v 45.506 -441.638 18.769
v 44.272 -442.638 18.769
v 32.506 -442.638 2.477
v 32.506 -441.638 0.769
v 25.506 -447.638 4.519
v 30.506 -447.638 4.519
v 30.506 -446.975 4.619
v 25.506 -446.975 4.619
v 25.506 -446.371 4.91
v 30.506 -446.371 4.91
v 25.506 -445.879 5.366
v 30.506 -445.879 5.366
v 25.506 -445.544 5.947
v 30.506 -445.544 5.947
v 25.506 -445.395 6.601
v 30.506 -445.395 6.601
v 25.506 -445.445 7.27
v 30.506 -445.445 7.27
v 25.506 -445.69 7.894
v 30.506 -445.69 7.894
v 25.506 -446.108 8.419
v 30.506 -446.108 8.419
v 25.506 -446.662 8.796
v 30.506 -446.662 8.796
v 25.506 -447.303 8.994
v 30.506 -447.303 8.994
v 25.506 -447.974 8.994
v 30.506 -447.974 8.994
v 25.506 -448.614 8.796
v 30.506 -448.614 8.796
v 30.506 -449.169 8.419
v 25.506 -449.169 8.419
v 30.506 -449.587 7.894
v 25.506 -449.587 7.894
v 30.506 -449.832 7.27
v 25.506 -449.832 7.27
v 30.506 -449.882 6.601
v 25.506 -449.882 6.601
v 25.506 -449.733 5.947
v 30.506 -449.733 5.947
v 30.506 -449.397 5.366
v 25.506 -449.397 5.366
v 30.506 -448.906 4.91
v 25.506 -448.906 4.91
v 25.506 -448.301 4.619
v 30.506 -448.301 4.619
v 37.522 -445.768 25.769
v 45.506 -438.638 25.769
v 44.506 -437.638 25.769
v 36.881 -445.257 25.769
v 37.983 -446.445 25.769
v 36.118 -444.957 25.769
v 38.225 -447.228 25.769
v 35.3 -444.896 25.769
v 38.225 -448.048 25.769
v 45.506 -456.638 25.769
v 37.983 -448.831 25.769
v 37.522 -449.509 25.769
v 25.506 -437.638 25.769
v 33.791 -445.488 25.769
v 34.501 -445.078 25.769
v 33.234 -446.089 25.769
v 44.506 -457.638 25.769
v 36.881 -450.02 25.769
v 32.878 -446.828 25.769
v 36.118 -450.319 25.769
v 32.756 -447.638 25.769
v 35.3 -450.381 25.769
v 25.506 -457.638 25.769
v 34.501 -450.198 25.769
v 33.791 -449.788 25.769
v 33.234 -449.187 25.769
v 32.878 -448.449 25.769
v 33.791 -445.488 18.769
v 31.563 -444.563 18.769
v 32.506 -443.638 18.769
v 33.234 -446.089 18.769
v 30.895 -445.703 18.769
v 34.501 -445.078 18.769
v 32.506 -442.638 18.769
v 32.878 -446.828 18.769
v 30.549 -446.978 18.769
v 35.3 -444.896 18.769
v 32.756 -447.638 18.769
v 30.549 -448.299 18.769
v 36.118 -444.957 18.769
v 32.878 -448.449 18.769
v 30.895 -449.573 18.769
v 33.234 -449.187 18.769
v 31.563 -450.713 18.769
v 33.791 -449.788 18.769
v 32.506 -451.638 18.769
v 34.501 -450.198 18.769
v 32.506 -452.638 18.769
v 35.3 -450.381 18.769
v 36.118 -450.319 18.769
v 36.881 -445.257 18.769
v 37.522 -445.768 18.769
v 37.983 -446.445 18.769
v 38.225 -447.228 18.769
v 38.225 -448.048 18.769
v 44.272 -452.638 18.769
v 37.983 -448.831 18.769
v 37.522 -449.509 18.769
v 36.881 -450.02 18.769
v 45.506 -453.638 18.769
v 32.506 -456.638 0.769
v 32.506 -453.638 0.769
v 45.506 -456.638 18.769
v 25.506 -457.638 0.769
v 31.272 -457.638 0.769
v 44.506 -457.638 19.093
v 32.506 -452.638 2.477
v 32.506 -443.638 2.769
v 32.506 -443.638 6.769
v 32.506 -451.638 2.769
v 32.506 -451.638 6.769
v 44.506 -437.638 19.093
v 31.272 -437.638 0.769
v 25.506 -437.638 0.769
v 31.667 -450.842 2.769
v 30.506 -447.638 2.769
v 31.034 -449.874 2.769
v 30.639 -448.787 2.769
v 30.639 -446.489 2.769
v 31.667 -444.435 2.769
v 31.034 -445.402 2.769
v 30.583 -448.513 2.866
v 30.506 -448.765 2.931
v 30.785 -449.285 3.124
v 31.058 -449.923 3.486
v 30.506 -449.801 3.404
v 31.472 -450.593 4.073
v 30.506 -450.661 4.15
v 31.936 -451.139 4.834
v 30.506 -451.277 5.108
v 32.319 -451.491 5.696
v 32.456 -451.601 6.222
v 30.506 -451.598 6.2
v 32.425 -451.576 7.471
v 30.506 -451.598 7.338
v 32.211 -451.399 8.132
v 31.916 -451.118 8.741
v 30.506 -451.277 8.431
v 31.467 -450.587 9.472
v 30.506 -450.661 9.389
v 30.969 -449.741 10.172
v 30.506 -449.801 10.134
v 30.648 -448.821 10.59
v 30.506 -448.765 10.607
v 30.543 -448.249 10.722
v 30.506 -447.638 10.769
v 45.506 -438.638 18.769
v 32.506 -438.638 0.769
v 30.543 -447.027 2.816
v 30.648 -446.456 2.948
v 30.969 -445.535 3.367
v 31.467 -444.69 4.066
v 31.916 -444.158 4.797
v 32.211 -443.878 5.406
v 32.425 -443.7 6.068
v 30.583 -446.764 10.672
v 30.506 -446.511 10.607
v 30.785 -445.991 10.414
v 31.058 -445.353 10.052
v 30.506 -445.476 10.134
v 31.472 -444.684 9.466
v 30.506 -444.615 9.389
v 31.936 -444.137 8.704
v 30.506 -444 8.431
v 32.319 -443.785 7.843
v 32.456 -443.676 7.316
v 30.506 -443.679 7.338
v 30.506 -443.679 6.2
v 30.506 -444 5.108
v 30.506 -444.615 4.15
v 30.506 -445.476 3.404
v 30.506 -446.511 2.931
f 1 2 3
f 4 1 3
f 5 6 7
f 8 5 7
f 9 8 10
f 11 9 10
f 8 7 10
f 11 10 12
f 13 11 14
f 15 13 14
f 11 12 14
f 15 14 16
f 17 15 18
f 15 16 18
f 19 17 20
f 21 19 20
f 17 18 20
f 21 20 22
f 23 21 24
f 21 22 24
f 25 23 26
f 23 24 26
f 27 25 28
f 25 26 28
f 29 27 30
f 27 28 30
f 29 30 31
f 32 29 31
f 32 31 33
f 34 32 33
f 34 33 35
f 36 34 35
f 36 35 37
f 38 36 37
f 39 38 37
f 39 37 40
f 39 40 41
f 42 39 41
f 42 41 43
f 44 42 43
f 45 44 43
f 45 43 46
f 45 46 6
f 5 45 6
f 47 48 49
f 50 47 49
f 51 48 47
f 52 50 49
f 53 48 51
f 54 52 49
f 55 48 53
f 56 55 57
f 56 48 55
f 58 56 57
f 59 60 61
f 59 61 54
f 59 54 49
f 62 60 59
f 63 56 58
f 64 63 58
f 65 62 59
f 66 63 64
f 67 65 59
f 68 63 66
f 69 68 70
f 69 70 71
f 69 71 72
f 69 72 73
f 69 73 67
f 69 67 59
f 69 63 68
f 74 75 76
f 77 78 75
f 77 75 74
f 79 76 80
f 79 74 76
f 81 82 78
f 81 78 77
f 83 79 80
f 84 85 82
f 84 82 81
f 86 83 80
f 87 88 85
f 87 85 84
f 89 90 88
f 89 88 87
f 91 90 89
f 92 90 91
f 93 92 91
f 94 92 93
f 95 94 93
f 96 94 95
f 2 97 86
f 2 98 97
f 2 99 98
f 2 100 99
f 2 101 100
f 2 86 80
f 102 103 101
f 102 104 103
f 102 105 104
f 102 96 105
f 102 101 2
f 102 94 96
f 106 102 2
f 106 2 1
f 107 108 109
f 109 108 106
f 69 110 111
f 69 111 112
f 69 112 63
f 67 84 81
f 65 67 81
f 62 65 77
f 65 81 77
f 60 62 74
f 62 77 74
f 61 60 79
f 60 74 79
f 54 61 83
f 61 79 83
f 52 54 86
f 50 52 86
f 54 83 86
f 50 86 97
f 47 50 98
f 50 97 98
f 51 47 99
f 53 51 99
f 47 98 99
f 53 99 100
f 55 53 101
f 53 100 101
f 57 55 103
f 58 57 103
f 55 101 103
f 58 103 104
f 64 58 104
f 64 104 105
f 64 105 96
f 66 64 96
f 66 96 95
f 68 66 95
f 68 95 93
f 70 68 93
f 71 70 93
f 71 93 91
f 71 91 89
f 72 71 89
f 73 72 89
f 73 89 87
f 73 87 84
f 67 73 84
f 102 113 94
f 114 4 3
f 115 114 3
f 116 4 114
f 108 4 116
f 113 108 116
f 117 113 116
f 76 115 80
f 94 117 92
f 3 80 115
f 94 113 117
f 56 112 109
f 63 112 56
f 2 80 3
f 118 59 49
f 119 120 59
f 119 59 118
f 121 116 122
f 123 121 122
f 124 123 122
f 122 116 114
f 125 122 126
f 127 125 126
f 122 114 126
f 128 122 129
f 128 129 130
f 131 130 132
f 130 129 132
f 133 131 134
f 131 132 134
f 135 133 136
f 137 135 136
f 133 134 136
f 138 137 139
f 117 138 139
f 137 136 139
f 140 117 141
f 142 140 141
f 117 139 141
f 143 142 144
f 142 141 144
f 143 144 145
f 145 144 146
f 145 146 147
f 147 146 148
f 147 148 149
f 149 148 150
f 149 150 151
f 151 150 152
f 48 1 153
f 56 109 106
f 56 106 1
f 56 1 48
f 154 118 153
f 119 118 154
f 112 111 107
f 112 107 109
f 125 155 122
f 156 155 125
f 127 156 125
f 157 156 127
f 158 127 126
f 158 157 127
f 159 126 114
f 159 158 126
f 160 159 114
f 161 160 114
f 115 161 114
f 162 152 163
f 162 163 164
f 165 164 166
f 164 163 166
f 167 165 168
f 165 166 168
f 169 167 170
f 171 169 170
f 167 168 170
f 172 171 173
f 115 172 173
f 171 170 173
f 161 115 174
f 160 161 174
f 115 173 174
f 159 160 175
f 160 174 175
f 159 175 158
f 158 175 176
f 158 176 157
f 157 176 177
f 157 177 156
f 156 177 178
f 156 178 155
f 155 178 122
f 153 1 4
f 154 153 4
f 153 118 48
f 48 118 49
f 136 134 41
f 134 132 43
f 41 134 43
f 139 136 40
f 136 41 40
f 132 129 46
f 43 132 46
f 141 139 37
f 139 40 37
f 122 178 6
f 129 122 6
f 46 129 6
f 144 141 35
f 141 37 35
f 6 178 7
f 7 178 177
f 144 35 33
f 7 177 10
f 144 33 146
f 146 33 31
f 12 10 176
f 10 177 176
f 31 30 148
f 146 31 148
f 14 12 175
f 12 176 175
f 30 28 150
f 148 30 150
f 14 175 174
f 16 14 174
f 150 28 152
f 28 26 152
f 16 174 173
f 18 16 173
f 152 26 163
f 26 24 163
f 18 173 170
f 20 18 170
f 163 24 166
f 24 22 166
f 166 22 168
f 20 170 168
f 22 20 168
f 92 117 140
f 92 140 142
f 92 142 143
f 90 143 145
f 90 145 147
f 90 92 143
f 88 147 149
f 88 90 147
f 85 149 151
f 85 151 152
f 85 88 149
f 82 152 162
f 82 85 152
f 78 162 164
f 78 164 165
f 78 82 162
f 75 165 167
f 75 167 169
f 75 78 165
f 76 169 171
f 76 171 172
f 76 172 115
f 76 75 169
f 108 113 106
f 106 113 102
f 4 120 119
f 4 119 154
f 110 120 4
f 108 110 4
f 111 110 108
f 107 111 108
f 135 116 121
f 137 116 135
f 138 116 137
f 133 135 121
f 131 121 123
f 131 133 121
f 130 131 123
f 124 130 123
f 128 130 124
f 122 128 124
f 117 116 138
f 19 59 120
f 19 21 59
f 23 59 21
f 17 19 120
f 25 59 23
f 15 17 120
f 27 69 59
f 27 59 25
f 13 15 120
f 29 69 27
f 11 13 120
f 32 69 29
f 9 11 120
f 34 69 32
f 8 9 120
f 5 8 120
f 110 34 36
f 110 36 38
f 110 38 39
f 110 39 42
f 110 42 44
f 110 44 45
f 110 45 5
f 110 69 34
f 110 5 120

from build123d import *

# Parameters (mm, degrees)
MAIN_DEPTH         = 20
SKETCH3_R          = 2.25
SCREW_HOLE_DEPTH   = 459.547512827
SKETCH4_R          = 2.75
SCREW_HOLE_2_DEPTH = 461.247257207
SCREW_CUT_R        = 5
SCREWCUT_DEPTH     = 16
CUT_EXTRUDE7_START = -5
SKETCH7_R          = 4
CUT_EXTRUDE7_DEPTH = 5
RIB3_REACH         = 57.989
SKETCH8_WALL_W     = 136.182475206
SKETCH8_WALL_H     = 5
RIB4_REACH         = 57.989
SKETCH9_WALL_W     = 136.182475206
SKETCH9_WALL_H     = 5
CHAMFER1_SIZE      = 1


with BuildPart() as part:
    # Sketch2 → main (new body)
    with BuildSketch(Plane(origin=(0, -457.638253618, -1.412254138), x_dir=(1, 0, 0), z_dir=(0, 1, 0))):
        Polygon((25.505676484, -2.181428465), (32.505676484, -2.181428465), (32.505676484, -20.181428465), (45.505676484, -20.181428465), (45.505676484, -27.181428465), (25.505676484, -27.181428465), align=None)
    extrude(amount=MAIN_DEPTH)

    # Sketch3 → screw_hole (cut, through all)
    with BuildSketch(Plane(origin=(32.505676484, 0, 0), x_dir=(0, 0, -1), z_dir=(1, 0, 0))):
        with Locations((-6.769174326, -447.638253618)):
            Circle(SKETCH3_R)
    extrude(amount=-SCREW_HOLE_DEPTH, mode=Mode.SUBTRACT)

    # Sketch4 → screw_hole_2 (cut, through all)
    with BuildSketch(Plane(origin=(0, 0, 18.769174326), x_dir=(-1, 0, 0), z_dir=(0, 0, -1))):
        with Locations((-35.505676484, -447.638253618)):
            Circle(SKETCH4_R)
    extrude(amount=-SCREW_HOLE_2_DEPTH, mode=Mode.SUBTRACT)

    # screw_cut → screwcut (cut)
    with BuildSketch(Plane(origin=(0, 0, 18.769174326), x_dir=(-1, 0, 0), z_dir=(0, 0, -1))):
        with Locations((-35.505676484, -447.638253618)):
            Circle(SCREW_CUT_R)
    extrude(amount=SCREWCUT_DEPTH, mode=Mode.SUBTRACT)

    # Sketch7 → Cut-Extrude7 (cut)
    with BuildSketch(Plane.ZY.offset(-25.505676484).offset(CUT_EXTRUDE7_START)):
        with Locations((6.769174326, -447.638253618)):
            Circle(SKETCH7_R)
    extrude(amount=-CUT_EXTRUDE7_DEPTH, mode=Mode.SUBTRACT)

    # Sketch8 wall → Rib3 (add, up to next)
    with BuildSketch(Plane(origin=(39.005676484, -457.638253618, 9.769174326), x_dir=(0.585490553844, 0, 0.8106792284), z_dir=(-0.8106792284, 0, 0.585490553844)), mode=Mode.PRIVATE) as rib3_sk1:
        with Locations((0, 2.5)):
            Rectangle(SKETCH8_WALL_W, SKETCH8_WALL_H)
    rib3_tool1 = extrude(rib3_sk1.sketch, amount=RIB3_REACH, mode=Mode.PRIVATE) - part.part
    add(rib3_tool1.solids().sort_by_distance((39.005676484, -457.638253618, 9.769174326))[0])

    # Sketch9 wall → Rib4 (add, up to next)
    with BuildSketch(Plane(origin=(39.005676484, -437.638253618, 9.769174326), x_dir=(0.585490553844, 0, 0.8106792284), z_dir=(0.8106792284, 0, -0.585490553844)), mode=Mode.PRIVATE) as rib4_sk1:
        with Locations((0, 2.5)):
            Rectangle(SKETCH9_WALL_W, SKETCH9_WALL_H)
    rib4_tool1 = extrude(rib4_sk1.sketch, amount=-RIB4_REACH, mode=Mode.PRIVATE) - part.part
    add(rib4_tool1.solids().sort_by_distance((39.005676484, -437.638253618, 9.769174326))[0])

    # Chamfer1
    chamfer1_edges = [part.edges().sort_by_distance(p)[0] for p in [
        (39.005676484, -437.638253618, 9.769174326),
        (45.505676484, -437.638253618, 22.269174326),
        (39.005676484, -457.638253618, 9.769174326),
        (45.505676484, -457.638253618, 22.269174326),
        (39.005676484, -452.638253618, 9.769174326),
        (39.005676484, -442.638253618, 9.769174326),
    ]]
    chamfer(chamfer1_edges, length=CHAMFER1_SIZE)


solid = part.part
